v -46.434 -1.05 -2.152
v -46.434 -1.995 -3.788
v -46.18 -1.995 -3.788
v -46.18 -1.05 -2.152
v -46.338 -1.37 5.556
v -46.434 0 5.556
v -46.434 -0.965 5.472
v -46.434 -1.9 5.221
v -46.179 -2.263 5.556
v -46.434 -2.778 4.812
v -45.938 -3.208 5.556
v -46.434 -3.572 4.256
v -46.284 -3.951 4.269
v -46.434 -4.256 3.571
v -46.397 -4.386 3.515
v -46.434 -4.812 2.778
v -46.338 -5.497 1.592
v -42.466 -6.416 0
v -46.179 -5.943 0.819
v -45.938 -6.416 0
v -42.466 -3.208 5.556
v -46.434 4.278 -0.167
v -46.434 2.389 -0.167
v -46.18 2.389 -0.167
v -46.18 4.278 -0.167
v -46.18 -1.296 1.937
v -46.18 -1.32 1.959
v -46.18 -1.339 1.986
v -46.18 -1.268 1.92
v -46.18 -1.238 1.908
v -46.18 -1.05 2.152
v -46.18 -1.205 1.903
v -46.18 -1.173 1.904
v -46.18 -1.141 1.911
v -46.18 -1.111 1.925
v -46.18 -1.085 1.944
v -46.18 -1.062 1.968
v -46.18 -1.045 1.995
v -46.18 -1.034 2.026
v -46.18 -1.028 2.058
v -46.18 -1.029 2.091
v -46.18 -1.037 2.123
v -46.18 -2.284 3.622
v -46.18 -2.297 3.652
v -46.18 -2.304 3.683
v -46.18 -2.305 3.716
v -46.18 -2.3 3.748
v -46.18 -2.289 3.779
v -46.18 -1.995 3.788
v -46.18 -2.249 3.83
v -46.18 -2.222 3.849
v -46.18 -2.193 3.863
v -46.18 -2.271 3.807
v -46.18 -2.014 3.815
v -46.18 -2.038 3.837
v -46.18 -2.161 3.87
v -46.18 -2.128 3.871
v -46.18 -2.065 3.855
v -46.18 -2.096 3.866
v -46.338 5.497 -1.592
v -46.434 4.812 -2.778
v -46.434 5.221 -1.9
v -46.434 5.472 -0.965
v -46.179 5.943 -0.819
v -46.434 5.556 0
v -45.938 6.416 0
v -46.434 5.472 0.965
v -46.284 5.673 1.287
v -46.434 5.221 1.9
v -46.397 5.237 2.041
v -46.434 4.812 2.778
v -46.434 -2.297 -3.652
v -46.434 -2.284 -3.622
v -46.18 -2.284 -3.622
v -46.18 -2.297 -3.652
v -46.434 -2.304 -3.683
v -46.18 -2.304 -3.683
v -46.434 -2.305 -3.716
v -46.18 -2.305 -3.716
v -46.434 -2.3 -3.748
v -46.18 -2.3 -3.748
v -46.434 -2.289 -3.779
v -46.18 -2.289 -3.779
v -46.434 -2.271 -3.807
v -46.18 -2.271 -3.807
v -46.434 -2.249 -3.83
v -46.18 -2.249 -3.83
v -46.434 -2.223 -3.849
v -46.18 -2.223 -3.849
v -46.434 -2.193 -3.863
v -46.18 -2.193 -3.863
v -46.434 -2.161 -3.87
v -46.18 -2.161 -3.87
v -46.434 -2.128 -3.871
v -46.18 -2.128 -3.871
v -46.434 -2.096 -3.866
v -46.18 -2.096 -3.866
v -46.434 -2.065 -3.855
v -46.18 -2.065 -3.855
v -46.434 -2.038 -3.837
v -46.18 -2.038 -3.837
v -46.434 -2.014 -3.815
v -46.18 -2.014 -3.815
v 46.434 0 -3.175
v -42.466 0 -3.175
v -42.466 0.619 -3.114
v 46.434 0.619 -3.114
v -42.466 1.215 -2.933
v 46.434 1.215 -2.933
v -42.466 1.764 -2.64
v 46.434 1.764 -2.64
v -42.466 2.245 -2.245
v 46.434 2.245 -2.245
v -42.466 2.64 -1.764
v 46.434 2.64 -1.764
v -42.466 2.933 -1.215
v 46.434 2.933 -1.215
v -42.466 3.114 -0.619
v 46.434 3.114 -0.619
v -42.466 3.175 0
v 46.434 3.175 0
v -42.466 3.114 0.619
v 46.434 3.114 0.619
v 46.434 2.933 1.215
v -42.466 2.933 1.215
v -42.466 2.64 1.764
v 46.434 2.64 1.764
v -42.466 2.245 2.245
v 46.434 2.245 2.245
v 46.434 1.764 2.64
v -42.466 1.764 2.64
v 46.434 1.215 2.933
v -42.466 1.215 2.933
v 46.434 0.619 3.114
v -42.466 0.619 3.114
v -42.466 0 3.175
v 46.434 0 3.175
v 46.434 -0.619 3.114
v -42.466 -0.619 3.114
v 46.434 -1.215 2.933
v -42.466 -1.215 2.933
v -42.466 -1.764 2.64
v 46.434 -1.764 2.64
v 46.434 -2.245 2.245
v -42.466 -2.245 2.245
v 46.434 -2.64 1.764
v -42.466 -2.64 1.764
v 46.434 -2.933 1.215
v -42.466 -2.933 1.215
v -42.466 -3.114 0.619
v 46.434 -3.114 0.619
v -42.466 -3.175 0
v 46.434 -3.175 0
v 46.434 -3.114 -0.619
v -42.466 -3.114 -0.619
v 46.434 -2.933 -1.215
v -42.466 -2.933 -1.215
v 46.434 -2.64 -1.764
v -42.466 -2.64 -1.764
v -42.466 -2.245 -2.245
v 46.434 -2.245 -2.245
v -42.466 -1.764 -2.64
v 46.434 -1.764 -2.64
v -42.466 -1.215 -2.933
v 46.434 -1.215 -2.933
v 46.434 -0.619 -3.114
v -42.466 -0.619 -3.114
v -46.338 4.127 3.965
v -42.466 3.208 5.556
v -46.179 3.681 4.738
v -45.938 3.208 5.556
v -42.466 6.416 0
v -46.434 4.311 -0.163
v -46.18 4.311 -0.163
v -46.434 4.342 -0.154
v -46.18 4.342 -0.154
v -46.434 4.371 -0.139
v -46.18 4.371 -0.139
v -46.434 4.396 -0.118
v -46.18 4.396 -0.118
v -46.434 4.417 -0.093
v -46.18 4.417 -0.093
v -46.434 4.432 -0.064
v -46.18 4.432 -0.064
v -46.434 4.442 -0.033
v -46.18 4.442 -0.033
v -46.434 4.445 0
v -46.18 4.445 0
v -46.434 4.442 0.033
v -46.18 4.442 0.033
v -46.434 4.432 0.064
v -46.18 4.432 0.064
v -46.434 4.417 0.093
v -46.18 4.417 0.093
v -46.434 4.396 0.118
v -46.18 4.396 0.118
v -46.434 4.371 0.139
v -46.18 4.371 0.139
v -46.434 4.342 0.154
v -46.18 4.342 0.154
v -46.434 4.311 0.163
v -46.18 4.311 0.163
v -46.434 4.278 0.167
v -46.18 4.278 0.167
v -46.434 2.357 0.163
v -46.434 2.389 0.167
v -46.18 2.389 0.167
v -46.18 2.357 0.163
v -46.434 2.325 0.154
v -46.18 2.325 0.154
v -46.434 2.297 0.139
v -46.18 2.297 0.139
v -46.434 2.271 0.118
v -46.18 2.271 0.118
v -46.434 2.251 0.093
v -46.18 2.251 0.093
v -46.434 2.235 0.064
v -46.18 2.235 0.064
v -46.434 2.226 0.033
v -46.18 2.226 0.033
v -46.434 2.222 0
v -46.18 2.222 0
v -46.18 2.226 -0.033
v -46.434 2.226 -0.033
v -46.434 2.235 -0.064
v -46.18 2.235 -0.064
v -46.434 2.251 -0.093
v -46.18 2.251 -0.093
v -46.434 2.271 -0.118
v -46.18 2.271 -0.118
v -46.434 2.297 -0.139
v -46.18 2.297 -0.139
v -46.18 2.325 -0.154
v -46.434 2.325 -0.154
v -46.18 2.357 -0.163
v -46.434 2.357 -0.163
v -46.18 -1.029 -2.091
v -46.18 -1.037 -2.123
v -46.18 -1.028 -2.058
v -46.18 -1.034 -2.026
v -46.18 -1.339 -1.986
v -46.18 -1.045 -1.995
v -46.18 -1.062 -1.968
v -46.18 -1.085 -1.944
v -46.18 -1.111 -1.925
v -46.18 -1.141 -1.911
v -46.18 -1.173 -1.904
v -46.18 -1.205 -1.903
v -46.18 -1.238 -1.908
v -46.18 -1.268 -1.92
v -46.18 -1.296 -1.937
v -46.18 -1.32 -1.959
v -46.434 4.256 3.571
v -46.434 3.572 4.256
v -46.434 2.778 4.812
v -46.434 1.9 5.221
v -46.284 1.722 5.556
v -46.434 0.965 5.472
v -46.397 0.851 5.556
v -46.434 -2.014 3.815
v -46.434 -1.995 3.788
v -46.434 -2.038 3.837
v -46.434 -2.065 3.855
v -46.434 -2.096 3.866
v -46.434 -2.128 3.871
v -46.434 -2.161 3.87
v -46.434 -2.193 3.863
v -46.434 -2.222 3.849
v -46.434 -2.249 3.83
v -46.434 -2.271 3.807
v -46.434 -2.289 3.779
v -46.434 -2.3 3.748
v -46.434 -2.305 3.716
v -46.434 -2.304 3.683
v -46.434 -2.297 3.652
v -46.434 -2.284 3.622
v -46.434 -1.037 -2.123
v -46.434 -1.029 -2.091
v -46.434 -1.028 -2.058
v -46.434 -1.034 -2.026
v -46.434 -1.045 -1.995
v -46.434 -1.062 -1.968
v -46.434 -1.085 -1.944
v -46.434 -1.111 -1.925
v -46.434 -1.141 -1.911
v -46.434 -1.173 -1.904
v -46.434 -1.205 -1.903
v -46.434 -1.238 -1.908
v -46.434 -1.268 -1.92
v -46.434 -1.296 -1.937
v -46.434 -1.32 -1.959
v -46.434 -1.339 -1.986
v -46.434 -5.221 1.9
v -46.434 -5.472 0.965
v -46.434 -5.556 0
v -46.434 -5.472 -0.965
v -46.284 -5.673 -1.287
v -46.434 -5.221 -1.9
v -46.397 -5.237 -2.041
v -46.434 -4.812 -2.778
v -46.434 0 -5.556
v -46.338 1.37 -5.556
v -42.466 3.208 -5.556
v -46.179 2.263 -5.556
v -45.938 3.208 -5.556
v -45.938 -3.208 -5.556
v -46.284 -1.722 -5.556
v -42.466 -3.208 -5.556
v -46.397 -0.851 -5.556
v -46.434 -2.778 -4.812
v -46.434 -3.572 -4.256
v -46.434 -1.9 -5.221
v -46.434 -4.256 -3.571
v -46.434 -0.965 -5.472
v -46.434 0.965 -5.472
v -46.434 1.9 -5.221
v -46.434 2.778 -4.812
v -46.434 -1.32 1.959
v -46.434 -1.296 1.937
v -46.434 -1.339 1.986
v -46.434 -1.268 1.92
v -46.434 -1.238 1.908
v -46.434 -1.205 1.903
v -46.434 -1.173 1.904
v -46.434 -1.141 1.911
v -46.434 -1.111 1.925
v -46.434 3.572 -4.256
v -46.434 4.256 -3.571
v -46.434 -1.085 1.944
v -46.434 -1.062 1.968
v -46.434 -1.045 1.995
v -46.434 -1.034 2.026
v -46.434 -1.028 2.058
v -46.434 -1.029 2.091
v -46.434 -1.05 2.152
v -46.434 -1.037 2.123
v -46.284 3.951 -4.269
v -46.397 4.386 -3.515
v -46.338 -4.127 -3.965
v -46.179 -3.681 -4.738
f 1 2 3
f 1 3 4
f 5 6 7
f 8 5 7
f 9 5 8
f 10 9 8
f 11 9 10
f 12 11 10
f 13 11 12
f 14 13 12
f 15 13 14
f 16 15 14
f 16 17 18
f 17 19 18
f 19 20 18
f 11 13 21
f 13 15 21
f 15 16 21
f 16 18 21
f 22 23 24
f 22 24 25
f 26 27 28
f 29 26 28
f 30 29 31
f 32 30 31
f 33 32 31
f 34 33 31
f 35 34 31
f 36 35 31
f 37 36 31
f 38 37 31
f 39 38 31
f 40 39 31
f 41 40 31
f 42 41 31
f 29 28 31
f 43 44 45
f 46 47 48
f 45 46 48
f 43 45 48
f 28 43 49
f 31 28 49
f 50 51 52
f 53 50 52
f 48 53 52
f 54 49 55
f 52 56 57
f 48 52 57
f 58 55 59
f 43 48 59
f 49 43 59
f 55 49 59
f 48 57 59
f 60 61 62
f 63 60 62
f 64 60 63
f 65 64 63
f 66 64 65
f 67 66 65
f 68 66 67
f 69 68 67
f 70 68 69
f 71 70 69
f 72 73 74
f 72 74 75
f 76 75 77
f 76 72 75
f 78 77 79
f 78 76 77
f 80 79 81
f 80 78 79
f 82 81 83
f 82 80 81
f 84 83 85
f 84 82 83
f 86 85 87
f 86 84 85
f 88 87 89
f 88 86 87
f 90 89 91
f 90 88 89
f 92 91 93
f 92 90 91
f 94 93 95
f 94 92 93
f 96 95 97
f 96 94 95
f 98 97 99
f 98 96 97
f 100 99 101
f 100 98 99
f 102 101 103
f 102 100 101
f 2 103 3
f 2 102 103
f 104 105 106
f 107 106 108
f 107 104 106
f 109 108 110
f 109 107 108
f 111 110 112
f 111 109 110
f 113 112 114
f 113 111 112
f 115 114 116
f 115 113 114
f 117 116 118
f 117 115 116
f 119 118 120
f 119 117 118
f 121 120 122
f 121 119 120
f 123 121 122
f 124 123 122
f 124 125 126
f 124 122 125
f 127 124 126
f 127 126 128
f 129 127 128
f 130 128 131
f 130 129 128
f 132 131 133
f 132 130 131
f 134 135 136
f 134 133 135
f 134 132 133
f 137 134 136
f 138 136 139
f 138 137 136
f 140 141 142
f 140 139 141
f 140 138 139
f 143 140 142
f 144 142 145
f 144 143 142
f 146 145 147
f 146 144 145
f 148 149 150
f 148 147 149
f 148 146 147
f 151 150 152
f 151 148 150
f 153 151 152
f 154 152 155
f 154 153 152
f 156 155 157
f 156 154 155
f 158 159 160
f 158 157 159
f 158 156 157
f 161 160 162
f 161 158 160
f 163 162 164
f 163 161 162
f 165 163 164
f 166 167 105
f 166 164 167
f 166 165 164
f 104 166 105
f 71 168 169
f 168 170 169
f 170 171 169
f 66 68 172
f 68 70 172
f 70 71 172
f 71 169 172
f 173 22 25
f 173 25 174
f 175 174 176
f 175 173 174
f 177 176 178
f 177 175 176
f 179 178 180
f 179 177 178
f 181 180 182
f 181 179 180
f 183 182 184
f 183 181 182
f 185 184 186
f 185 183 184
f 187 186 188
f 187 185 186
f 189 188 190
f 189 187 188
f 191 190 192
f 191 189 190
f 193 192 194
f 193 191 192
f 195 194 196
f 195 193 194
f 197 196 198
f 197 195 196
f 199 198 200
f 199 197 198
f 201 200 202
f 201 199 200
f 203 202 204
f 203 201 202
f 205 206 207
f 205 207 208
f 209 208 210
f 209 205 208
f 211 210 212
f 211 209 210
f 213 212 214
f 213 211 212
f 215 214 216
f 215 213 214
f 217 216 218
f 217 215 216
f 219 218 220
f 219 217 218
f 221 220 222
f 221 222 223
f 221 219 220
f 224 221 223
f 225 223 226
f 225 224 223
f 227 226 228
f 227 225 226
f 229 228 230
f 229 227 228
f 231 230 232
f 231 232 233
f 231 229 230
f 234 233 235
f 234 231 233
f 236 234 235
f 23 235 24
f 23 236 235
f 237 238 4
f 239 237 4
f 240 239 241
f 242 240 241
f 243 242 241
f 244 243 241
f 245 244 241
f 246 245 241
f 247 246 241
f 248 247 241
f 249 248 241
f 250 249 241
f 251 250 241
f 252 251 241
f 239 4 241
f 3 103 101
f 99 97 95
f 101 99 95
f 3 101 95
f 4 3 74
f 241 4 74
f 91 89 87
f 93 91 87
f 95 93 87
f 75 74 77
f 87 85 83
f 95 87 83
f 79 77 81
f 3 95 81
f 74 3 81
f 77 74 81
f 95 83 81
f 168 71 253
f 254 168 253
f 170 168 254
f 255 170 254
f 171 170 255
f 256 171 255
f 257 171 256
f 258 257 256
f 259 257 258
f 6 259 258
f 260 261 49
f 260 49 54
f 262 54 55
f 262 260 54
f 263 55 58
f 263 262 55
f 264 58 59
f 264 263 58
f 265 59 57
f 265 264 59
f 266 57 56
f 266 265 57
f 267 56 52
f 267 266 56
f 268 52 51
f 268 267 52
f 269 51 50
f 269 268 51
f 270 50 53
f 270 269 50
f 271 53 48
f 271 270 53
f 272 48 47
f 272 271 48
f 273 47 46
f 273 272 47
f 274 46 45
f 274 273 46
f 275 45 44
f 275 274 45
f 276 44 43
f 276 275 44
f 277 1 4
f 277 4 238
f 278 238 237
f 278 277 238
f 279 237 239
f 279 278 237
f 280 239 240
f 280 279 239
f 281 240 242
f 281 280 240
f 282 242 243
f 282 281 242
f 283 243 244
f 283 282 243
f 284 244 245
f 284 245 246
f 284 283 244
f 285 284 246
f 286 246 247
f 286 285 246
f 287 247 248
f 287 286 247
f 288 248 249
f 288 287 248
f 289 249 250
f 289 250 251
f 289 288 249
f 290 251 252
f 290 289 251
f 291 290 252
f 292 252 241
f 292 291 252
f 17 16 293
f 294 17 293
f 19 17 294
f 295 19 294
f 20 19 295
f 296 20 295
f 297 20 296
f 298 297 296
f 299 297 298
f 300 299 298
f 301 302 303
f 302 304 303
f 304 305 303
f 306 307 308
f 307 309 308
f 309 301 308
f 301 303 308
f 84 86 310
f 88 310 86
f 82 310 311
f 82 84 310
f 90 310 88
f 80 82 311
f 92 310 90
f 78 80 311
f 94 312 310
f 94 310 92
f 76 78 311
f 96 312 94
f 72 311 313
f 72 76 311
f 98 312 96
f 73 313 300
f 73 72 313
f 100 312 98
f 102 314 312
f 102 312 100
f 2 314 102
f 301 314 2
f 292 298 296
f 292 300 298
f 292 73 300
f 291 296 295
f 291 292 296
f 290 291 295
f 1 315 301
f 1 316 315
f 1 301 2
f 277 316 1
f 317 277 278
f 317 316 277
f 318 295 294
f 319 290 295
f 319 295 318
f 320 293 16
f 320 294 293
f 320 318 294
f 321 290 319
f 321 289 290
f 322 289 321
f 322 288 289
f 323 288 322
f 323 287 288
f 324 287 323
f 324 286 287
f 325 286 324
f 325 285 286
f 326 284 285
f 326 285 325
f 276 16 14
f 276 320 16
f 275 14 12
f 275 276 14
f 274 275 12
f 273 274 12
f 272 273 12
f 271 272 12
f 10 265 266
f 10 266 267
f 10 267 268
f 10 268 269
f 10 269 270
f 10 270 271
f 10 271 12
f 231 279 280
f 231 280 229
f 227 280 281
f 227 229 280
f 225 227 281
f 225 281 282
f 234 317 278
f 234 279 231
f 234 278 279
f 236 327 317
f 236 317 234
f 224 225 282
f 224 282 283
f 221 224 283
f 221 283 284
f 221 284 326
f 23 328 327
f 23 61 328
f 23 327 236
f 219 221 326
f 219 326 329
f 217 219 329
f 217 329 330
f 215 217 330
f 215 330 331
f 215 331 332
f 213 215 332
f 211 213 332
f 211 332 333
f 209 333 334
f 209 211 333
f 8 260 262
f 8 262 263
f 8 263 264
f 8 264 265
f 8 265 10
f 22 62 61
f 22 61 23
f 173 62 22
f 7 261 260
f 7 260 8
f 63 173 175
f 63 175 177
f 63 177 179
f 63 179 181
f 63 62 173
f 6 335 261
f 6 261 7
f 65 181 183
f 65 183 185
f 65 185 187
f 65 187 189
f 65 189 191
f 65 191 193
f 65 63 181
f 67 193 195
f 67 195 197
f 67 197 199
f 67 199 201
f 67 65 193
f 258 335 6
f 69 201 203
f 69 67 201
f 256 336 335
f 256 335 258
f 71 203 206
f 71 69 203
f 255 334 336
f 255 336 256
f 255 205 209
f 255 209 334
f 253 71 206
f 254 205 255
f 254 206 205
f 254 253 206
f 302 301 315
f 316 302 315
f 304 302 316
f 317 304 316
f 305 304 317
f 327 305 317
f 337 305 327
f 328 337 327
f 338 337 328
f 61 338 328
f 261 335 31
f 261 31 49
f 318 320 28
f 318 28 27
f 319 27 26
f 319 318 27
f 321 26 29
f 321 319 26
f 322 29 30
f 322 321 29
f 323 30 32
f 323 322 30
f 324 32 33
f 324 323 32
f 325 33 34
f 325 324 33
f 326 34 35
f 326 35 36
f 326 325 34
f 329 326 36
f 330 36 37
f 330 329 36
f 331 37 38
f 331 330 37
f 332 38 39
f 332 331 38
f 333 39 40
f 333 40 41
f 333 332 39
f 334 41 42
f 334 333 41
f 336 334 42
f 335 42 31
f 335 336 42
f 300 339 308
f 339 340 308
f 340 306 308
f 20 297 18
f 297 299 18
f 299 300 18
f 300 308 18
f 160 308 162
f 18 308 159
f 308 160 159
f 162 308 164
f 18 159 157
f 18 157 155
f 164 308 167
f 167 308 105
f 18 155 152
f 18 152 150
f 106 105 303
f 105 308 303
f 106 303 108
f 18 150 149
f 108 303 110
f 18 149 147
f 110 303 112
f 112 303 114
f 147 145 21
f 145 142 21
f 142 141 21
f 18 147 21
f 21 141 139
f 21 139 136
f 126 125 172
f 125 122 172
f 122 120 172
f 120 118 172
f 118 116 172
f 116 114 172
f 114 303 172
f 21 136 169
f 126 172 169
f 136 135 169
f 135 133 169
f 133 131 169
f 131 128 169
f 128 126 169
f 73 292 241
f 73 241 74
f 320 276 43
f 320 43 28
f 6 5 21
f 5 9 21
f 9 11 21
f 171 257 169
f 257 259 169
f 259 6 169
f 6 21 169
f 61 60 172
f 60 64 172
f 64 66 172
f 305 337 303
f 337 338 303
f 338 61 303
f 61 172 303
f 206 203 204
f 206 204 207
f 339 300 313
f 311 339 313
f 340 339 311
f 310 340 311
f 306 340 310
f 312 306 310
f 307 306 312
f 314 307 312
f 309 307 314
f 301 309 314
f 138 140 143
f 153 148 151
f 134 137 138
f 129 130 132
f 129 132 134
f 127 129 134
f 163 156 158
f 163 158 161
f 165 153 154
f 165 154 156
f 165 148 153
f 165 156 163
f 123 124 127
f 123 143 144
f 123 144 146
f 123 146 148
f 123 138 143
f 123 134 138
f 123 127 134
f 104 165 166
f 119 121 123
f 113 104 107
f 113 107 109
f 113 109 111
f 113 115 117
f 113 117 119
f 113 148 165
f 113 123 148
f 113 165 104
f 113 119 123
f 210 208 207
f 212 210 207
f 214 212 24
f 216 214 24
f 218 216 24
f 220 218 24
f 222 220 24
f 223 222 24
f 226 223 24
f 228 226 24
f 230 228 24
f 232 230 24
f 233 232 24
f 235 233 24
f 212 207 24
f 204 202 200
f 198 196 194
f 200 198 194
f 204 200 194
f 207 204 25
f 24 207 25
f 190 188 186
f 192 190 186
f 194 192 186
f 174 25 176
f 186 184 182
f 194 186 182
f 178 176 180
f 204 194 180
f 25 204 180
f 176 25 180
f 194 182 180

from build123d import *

# Parameters (mm, degrees)
SKETCH5_R           = 3.175
BOSS_EXTRUDE3_DEPTH = 88.9
BOSS_EXTRUDE4_DEPTH = 3.96875
SKETCH8_OUTSIDE_W   = 357.164
SKETCH8_OUTSIDE_H   = 358.884
SKETCH8_OUTSIDE_R   = 5.55625
CUT_EXTRUDE3_DEPTH  = 93.86875
CUT_EXTRUDE3_TAPER  = 60
CUT_EXTRUDE4_DEPTH  = 0.254
CIRPATTERN1_COUNT   = 3


with BuildPart() as part:
    # Sketch5 → Boss-Extrude3 (new body)
    with BuildSketch(Plane(origin=(46.434375, 0, 0), x_dir=(0, 0, -1), z_dir=(1, 0, 0))):
        Circle(SKETCH5_R)
    extrude(amount=-BOSS_EXTRUDE3_DEPTH)

    # Sketch11 → Revolve1 (revolve)
    with BuildSketch(Plane.XY):
        Polygon((-42.465625, 3.175), (-42.465625, 0), (30.559375, 0), (27.384375, 3.175), align=None)
    revolve(axis=Axis((-42.465625, 0, 0), (1, 0, 0)))

    # Sketch6 → Boss-Extrude4 (add)
    with BuildSketch(Plane.ZY.offset(42.465625)):
        Polygon((5.55625, 3.207902433), (0, 6.415804866), (-5.55625, 3.207902433), (-5.55625, -3.207902433), (0, -6.415804866), (5.55625, -3.207902433), align=None)
    extrude(amount=BOSS_EXTRUDE4_DEPTH)

    # Sketch8 outside → Cut-Extrude3 (cut, through all)
    with BuildSketch(Plane.ZY.offset(46.434375)):
        Rectangle(SKETCH8_OUTSIDE_W, SKETCH8_OUTSIDE_H)
        Circle(SKETCH8_OUTSIDE_R, mode=Mode.SUBTRACT)
    extrude(amount=-CUT_EXTRUDE3_DEPTH, taper=CUT_EXTRUDE3_TAPER, mode=Mode.SUBTRACT)

    # Sketch12 → Cut-Extrude4 (cut)
    with BuildSketch(Plane.ZY.offset(46.434375)):
        with BuildLine():
            Line((0.1666875, 4.2783125), (0.1666875, 2.3891875))
            ThreePointArc((0.1666875, 2.3891875), (0, 2.2225), (-0.1666875, 2.3891875))
            Line((-0.1666875, 2.3891875), (-0.1666875, 4.2783125))
            ThreePointArc((-0.1666875, 4.2783125), (0, 4.445), (0.1666875, 4.2783125))
        make_face()
    cut_extrude4 = extrude(amount=-CUT_EXTRUDE4_DEPTH, mode=Mode.SUBTRACT)

    # CirPattern1: Cut-Extrude4 ×3 about axis
    cirpattern1_axis = Axis((0, 0, 0), (1, 0, 0))
    for i in range(1, CIRPATTERN1_COUNT):
        add(cut_extrude4.rotate(cirpattern1_axis, i * 360 / CIRPATTERN1_COUNT), mode=Mode.SUBTRACT)


solid = part.part
